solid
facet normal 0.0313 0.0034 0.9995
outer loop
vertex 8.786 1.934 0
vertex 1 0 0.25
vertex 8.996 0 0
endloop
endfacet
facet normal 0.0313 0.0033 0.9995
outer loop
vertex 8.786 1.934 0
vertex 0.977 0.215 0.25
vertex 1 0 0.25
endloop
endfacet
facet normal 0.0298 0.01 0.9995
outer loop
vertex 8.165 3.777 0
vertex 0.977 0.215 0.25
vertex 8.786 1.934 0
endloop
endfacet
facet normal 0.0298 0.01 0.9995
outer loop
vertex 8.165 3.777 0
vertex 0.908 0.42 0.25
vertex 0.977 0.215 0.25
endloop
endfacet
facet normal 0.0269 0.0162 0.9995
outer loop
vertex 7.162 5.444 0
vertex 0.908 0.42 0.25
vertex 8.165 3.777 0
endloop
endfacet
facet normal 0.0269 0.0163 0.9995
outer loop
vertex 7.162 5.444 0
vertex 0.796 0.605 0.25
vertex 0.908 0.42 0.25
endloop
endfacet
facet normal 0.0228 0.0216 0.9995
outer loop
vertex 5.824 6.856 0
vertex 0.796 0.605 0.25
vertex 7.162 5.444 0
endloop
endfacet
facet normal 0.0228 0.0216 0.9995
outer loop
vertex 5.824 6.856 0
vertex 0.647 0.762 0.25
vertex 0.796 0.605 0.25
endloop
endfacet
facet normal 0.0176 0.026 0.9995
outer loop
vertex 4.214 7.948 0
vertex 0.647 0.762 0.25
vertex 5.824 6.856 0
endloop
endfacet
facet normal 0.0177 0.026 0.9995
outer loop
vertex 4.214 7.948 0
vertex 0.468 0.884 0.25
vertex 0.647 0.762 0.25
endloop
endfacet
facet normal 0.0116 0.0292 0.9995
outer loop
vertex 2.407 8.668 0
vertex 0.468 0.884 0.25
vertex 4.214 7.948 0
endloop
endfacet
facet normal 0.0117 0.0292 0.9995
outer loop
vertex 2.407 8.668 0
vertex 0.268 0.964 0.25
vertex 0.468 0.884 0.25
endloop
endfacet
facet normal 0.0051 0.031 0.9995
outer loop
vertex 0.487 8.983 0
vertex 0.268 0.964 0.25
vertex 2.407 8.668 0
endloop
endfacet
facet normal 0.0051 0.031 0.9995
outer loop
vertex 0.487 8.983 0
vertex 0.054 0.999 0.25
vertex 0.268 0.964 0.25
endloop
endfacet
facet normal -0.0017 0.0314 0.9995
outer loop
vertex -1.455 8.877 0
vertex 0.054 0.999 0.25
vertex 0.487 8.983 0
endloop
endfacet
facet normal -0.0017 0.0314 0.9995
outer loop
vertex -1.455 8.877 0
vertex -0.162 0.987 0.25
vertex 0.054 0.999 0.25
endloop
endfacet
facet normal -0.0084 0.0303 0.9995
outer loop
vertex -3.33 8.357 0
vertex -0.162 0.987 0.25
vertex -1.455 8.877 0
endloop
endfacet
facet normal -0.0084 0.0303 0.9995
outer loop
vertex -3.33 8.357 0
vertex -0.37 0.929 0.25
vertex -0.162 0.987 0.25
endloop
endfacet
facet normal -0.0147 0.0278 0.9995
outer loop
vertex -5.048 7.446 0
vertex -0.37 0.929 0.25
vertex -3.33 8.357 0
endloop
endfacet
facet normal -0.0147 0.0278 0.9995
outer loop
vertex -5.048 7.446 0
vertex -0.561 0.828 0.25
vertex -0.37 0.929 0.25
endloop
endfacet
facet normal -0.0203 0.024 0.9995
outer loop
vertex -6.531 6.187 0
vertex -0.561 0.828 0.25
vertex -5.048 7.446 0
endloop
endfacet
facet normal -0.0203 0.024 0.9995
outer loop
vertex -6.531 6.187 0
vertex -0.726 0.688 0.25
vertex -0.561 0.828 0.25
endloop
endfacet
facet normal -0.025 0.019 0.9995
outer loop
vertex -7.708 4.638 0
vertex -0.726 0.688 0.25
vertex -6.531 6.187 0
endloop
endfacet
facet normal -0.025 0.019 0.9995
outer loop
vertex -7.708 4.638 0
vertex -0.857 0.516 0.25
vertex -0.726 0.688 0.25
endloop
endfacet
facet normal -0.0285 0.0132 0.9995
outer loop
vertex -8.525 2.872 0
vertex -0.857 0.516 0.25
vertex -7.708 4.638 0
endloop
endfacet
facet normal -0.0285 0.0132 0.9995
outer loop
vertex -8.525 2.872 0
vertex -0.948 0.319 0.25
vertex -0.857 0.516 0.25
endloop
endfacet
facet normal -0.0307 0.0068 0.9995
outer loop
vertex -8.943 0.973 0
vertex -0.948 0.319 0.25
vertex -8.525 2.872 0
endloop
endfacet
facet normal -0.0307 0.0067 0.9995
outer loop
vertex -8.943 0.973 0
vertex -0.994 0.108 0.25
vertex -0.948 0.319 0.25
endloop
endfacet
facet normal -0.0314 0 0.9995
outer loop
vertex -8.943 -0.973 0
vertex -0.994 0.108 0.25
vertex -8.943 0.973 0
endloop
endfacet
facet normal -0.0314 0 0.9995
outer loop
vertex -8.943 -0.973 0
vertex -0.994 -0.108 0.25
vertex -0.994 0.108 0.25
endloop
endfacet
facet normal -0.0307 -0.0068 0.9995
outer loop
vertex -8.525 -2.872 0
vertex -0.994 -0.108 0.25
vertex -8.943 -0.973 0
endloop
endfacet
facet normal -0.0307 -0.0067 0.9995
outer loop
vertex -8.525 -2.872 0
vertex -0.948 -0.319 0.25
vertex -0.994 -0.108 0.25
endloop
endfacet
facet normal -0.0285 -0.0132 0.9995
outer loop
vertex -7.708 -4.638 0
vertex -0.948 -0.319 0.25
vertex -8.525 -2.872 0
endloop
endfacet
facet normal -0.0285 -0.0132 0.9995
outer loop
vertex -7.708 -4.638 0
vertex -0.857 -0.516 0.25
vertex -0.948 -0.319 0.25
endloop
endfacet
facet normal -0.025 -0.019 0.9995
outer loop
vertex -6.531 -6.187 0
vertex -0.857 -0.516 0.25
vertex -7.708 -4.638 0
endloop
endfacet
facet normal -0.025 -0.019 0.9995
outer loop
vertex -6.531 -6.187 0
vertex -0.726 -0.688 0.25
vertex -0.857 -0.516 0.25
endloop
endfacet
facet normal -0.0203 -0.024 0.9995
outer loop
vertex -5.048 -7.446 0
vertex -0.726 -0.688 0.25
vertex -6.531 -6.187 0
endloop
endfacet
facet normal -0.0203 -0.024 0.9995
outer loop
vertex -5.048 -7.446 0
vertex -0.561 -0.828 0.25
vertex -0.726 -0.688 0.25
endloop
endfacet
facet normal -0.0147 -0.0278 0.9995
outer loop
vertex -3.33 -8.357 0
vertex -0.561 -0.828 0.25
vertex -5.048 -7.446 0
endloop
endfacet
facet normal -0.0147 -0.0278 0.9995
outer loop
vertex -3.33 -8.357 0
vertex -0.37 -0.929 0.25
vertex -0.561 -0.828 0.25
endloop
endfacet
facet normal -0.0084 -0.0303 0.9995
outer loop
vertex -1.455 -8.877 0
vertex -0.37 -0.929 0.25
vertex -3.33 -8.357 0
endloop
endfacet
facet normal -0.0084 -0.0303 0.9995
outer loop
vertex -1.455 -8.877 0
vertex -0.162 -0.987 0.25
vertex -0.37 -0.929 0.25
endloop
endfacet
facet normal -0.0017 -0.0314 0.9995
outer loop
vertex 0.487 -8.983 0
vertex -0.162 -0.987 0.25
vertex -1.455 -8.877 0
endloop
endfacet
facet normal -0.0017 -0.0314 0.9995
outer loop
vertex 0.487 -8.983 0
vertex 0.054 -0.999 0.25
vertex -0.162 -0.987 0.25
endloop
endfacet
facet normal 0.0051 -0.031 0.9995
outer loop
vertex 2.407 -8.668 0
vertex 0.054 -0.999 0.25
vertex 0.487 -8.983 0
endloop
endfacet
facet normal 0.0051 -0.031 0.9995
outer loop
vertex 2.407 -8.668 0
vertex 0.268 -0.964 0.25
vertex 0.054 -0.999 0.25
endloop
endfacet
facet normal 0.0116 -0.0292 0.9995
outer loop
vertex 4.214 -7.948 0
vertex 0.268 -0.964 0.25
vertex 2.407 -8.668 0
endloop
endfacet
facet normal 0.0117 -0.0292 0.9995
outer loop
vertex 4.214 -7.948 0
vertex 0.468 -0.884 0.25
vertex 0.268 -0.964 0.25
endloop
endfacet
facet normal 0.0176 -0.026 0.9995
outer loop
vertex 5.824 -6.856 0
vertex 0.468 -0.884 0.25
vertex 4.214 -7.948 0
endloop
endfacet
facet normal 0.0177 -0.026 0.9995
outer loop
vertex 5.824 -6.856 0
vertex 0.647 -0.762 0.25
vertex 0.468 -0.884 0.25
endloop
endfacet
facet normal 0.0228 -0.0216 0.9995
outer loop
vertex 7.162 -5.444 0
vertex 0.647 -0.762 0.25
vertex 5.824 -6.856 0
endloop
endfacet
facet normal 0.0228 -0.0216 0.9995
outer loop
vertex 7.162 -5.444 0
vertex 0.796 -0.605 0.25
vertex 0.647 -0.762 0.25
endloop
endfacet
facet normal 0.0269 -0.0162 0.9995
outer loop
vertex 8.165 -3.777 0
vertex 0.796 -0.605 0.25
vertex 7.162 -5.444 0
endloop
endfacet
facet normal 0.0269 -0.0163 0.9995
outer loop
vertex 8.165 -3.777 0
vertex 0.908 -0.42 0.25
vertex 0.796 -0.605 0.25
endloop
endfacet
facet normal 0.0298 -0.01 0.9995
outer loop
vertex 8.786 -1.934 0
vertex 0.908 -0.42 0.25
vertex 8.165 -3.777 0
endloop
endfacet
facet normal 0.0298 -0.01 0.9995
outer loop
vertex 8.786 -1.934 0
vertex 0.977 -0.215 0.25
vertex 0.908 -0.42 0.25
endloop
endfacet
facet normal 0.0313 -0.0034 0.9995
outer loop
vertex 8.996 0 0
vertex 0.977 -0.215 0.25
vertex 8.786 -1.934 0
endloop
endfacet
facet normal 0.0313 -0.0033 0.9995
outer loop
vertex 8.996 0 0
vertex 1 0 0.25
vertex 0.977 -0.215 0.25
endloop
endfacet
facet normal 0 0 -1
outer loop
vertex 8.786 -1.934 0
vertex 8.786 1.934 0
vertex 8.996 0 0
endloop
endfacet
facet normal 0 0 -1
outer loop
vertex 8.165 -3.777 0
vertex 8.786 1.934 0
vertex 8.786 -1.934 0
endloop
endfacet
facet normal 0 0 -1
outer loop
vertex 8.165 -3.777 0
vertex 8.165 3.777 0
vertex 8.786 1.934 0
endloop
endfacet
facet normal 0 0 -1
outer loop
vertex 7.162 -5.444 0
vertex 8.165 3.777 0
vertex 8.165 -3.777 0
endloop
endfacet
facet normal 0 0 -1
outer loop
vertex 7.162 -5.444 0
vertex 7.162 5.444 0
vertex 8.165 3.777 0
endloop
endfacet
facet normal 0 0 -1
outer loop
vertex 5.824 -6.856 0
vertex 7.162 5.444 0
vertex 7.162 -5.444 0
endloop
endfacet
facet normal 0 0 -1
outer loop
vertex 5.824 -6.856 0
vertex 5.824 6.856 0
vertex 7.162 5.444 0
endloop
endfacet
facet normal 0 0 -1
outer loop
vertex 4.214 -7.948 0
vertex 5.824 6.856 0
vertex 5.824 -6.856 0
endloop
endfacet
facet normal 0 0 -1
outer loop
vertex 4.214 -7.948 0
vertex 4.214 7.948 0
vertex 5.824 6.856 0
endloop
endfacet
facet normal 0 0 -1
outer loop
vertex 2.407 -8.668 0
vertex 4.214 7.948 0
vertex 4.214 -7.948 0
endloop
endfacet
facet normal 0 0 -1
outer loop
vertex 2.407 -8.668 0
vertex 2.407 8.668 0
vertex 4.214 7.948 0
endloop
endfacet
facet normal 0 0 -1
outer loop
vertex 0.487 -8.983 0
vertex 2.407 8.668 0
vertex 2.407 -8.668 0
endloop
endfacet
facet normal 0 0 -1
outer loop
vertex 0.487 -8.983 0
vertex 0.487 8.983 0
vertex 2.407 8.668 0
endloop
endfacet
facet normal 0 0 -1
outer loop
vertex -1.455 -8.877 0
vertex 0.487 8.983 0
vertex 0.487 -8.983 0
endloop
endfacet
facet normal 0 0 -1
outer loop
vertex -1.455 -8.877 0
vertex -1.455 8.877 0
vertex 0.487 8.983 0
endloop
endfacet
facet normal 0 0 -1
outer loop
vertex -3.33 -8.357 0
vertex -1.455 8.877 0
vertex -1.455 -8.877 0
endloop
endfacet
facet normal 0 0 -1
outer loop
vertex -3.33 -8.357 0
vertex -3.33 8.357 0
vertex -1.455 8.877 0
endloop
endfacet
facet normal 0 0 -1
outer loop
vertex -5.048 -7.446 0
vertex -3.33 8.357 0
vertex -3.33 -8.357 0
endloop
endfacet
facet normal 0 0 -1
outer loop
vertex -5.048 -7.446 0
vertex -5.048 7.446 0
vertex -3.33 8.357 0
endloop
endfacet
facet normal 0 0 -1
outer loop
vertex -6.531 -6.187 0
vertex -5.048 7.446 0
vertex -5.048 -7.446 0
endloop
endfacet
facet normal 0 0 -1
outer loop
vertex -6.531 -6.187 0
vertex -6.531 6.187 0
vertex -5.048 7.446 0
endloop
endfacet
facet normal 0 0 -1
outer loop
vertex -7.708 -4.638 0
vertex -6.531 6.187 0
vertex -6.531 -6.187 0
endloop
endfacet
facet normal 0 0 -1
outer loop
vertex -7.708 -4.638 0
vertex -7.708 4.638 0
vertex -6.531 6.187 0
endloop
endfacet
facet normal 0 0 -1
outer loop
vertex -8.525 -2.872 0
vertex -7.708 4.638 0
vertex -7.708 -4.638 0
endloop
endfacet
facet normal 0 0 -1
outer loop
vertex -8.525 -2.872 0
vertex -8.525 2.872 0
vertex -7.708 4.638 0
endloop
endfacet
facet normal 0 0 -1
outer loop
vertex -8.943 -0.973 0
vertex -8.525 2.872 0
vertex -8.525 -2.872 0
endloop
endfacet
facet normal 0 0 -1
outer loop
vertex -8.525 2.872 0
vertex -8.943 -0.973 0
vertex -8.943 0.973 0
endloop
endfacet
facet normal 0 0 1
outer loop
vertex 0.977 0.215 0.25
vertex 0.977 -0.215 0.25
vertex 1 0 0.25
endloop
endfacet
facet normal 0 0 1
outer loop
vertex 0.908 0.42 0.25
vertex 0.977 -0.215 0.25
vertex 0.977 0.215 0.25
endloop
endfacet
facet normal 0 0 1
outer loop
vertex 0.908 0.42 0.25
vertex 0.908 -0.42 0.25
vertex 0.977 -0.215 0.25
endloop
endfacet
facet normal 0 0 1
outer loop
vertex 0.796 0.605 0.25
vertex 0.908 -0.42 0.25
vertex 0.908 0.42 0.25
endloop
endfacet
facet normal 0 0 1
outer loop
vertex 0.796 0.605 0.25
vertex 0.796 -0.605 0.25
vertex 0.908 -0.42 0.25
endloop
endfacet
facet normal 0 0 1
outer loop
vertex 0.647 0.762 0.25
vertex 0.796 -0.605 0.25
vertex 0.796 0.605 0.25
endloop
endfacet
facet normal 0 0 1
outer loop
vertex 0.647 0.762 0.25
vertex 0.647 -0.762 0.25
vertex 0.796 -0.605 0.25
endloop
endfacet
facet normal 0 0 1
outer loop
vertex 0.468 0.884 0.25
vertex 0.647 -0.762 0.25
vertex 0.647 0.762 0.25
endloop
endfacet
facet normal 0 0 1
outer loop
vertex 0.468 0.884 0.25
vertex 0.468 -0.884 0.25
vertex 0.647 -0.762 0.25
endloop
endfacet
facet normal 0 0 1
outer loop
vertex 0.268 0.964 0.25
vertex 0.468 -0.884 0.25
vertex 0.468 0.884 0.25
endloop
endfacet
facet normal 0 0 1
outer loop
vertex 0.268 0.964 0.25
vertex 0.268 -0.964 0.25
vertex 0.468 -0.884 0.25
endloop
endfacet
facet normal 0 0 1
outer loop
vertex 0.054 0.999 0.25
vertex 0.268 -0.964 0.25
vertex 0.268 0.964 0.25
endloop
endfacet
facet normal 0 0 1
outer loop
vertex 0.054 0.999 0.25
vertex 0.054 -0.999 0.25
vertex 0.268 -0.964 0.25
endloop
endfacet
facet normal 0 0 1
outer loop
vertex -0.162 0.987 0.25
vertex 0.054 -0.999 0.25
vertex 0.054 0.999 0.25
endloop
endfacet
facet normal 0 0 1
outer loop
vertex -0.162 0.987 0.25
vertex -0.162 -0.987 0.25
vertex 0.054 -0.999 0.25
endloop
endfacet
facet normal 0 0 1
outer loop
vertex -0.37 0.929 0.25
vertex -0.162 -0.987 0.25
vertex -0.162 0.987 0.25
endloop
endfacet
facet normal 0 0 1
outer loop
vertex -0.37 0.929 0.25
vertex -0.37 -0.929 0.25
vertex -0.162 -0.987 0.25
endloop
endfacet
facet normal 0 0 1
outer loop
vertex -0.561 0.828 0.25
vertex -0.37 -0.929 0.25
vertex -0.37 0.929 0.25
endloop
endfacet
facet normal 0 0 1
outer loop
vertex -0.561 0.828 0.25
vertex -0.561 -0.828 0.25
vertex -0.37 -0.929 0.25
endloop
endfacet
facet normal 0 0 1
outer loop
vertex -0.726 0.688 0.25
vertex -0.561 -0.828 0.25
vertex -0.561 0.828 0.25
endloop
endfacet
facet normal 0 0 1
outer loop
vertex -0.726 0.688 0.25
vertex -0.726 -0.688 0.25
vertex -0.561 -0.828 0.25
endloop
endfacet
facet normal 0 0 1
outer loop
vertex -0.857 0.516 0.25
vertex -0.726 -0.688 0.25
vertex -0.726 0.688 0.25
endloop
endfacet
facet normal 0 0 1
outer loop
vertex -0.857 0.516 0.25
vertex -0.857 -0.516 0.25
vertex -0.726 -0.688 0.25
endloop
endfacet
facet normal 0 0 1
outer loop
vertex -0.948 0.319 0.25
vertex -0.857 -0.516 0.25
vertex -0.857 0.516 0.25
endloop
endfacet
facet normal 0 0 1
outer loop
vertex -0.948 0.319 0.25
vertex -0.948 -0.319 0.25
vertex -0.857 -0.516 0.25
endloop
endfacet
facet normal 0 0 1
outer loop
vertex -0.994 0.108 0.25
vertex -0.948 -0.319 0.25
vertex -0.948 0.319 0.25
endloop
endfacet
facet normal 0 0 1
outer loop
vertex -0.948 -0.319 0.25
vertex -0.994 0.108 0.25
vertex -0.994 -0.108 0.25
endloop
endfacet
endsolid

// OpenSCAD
/*

	Variables iniciales para los tipos de agujeros	
	A
	B
	C
	D
*/

/*

	Diametro del cilindro en pulgadas	17.992
	Altura del cilindro	en pulgadas		0.250 
*/

diametro = 17.992;
altura = 0.250;
cylinder(altura,diametro/2);
